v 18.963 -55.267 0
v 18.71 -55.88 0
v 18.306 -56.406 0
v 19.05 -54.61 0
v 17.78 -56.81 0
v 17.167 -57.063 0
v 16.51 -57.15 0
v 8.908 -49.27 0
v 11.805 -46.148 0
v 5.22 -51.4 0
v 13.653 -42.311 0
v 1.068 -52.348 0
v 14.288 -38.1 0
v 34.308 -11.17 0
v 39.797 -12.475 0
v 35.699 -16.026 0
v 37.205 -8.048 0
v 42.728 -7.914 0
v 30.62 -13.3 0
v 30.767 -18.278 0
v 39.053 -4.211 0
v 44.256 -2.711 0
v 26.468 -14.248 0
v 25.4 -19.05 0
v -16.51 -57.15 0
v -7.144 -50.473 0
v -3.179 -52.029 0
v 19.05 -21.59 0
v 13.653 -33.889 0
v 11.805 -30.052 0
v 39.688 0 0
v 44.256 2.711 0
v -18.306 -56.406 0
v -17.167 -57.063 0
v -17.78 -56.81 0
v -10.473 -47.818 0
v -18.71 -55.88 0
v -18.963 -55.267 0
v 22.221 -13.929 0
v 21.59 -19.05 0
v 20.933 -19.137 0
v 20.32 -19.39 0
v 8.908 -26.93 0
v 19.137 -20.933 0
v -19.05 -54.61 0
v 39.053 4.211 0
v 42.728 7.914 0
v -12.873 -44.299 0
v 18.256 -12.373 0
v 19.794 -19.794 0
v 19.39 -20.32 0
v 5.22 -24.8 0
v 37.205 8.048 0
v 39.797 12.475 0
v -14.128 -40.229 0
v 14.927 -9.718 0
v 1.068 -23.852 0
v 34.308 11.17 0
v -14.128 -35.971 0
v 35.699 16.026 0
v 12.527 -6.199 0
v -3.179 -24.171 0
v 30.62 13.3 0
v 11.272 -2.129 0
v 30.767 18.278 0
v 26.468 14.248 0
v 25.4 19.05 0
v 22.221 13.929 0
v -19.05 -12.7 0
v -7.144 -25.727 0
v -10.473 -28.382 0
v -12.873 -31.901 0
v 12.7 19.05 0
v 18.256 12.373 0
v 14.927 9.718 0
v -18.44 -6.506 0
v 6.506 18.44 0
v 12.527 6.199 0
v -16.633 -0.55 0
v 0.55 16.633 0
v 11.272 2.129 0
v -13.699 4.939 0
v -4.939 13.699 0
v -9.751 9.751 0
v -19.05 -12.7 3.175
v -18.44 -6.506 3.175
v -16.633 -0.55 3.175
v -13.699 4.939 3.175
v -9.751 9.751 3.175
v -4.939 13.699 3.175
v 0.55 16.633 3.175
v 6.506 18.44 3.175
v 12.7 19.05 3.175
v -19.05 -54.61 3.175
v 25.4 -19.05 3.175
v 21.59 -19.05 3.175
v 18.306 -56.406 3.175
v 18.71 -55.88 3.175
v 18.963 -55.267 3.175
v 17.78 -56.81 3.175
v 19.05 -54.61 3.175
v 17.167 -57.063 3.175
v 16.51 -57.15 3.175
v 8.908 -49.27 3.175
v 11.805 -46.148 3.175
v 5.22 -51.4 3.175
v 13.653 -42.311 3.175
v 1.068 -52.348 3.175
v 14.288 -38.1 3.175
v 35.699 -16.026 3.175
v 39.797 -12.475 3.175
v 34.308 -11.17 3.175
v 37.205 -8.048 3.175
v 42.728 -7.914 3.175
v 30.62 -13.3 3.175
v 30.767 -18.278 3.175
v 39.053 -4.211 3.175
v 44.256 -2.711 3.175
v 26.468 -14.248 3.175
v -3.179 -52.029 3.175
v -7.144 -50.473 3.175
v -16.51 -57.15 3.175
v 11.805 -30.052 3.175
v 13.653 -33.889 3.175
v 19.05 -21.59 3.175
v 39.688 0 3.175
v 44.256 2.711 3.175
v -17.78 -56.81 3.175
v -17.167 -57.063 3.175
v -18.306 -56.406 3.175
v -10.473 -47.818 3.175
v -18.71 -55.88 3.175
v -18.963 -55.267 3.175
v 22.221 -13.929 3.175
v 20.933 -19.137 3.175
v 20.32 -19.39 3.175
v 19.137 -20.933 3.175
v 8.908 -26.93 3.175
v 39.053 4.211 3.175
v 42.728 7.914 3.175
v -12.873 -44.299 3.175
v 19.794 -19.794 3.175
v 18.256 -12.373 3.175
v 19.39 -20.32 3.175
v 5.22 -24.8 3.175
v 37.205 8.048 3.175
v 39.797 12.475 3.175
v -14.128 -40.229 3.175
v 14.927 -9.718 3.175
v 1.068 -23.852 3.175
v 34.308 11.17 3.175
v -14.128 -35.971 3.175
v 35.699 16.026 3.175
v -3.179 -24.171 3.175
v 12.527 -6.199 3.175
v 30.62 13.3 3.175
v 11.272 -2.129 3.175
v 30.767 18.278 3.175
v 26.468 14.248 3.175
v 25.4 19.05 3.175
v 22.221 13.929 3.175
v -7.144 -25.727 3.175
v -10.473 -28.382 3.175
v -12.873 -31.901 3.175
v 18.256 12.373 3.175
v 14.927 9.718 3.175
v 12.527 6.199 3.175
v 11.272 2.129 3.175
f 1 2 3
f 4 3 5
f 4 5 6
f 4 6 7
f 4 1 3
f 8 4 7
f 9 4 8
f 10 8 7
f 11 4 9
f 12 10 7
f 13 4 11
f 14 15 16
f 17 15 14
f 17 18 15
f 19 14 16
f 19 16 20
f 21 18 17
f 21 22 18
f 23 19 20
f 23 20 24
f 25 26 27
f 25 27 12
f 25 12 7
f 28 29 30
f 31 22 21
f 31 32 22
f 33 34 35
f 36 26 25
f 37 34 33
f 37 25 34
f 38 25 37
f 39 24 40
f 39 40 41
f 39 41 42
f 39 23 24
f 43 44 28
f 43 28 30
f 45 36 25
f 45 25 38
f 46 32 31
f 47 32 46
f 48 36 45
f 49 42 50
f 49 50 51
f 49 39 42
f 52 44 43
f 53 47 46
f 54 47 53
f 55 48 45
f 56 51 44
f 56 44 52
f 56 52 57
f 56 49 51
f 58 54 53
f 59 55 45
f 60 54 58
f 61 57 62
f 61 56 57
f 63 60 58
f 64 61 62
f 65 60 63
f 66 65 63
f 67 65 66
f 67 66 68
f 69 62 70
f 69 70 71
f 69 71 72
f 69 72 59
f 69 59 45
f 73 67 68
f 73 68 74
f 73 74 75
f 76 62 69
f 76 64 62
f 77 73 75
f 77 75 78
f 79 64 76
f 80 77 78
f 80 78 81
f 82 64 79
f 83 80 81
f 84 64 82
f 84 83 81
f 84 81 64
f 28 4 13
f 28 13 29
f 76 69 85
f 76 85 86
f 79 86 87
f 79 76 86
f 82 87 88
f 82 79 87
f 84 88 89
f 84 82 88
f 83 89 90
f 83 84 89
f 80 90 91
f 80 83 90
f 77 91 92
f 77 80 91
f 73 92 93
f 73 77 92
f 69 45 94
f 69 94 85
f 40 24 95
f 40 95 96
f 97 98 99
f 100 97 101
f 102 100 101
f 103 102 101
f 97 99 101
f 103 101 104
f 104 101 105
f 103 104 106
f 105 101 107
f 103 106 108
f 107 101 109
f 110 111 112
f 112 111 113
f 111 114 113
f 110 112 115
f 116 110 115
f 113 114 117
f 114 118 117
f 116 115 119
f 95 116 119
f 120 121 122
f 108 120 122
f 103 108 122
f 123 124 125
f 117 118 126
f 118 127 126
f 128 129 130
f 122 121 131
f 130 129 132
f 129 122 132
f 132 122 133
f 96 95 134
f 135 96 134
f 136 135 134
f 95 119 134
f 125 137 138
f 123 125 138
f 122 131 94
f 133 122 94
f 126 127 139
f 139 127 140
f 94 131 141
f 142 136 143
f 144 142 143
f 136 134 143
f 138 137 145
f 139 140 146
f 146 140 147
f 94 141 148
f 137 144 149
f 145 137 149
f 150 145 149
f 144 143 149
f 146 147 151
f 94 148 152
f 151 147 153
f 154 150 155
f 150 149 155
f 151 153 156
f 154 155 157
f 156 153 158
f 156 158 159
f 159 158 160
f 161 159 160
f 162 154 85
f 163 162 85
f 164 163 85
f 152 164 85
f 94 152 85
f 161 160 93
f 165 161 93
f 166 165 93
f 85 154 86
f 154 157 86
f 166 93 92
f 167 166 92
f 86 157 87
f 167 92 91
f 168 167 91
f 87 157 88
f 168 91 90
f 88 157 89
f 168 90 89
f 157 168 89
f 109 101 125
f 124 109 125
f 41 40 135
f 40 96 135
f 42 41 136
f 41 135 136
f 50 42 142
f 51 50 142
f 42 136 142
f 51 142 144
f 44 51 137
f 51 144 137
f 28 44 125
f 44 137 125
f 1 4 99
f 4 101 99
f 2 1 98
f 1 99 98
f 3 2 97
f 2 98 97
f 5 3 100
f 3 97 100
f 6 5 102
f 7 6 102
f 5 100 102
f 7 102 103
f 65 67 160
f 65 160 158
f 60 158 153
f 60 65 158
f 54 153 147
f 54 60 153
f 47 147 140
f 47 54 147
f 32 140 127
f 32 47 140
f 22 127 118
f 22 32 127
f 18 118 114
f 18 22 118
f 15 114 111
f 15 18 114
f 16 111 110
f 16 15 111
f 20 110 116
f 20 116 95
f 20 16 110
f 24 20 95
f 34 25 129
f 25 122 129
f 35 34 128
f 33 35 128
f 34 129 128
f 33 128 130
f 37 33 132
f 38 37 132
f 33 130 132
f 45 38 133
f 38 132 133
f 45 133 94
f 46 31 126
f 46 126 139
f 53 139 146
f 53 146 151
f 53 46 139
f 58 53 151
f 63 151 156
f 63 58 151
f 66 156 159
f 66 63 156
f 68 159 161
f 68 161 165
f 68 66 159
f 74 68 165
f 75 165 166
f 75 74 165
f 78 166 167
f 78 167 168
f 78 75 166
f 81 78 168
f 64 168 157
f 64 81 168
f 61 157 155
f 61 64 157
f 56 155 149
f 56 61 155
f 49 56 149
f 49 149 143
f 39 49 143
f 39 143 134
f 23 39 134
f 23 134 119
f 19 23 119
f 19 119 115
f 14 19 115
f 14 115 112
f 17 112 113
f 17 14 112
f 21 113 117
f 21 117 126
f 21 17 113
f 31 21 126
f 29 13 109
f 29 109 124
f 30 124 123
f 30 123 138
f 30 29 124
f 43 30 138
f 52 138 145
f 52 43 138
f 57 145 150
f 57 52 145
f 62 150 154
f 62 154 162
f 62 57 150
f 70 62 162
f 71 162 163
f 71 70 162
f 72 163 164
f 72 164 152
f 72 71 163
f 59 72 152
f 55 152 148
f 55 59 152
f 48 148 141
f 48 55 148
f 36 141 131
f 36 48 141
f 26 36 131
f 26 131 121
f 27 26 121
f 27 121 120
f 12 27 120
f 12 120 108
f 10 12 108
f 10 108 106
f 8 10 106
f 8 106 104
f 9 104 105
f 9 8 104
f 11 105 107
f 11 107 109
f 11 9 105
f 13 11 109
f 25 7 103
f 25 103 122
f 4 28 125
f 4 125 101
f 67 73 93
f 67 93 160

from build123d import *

# Parameters (mm, degrees)
SKETCH1_R           = 14.2875
BOSS_EXTRUDE1_DEPTH = 3.175
FILLET1_R           = 2.54


with BuildPart() as part:
    # Sketch1 → Boss-Extrude1 (new body)
    with BuildSketch(Plane.XY):
        with BuildLine():
            Line((25.4, -19.05), (19.05, -19.05))
            Line((19.05, -19.05), (19.05, -57.15))
            Line((19.05, -57.15), (-19.05, -57.15))
            Line((-19.05, -57.15), (-19.05, -19.05))
            Line((-19.05, -19.05), (-19.05, -12.7))
            ThreePointArc((-19.05, -12.7), (-9.750640303, 9.750640303), (12.7, 19.05))
            Line((12.7, 19.05), (25.4, 19.05))
            ThreePointArc((25.4, 19.05), (44.45, 0), (25.4, -19.05))
        make_face()
        with Locations((25.4, 0)):
            Circle(SKETCH1_R, mode=Mode.SUBTRACT)
        with Locations((0, -38.1)):
            Circle(SKETCH1_R, mode=Mode.SUBTRACT)
    extrude(amount=BOSS_EXTRUDE1_DEPTH)

    # Fillet1
    fillet1_edges = [part.edges().sort_by_distance(p)[0] for p in [
        (19.05, -19.05, 1.5875),
        (19.05, -57.15, 1.5875),
        (-19.05, -57.15, 1.5875),
    ]]
    fillet(fillet1_edges, radius=FILLET1_R)


solid = part.part
